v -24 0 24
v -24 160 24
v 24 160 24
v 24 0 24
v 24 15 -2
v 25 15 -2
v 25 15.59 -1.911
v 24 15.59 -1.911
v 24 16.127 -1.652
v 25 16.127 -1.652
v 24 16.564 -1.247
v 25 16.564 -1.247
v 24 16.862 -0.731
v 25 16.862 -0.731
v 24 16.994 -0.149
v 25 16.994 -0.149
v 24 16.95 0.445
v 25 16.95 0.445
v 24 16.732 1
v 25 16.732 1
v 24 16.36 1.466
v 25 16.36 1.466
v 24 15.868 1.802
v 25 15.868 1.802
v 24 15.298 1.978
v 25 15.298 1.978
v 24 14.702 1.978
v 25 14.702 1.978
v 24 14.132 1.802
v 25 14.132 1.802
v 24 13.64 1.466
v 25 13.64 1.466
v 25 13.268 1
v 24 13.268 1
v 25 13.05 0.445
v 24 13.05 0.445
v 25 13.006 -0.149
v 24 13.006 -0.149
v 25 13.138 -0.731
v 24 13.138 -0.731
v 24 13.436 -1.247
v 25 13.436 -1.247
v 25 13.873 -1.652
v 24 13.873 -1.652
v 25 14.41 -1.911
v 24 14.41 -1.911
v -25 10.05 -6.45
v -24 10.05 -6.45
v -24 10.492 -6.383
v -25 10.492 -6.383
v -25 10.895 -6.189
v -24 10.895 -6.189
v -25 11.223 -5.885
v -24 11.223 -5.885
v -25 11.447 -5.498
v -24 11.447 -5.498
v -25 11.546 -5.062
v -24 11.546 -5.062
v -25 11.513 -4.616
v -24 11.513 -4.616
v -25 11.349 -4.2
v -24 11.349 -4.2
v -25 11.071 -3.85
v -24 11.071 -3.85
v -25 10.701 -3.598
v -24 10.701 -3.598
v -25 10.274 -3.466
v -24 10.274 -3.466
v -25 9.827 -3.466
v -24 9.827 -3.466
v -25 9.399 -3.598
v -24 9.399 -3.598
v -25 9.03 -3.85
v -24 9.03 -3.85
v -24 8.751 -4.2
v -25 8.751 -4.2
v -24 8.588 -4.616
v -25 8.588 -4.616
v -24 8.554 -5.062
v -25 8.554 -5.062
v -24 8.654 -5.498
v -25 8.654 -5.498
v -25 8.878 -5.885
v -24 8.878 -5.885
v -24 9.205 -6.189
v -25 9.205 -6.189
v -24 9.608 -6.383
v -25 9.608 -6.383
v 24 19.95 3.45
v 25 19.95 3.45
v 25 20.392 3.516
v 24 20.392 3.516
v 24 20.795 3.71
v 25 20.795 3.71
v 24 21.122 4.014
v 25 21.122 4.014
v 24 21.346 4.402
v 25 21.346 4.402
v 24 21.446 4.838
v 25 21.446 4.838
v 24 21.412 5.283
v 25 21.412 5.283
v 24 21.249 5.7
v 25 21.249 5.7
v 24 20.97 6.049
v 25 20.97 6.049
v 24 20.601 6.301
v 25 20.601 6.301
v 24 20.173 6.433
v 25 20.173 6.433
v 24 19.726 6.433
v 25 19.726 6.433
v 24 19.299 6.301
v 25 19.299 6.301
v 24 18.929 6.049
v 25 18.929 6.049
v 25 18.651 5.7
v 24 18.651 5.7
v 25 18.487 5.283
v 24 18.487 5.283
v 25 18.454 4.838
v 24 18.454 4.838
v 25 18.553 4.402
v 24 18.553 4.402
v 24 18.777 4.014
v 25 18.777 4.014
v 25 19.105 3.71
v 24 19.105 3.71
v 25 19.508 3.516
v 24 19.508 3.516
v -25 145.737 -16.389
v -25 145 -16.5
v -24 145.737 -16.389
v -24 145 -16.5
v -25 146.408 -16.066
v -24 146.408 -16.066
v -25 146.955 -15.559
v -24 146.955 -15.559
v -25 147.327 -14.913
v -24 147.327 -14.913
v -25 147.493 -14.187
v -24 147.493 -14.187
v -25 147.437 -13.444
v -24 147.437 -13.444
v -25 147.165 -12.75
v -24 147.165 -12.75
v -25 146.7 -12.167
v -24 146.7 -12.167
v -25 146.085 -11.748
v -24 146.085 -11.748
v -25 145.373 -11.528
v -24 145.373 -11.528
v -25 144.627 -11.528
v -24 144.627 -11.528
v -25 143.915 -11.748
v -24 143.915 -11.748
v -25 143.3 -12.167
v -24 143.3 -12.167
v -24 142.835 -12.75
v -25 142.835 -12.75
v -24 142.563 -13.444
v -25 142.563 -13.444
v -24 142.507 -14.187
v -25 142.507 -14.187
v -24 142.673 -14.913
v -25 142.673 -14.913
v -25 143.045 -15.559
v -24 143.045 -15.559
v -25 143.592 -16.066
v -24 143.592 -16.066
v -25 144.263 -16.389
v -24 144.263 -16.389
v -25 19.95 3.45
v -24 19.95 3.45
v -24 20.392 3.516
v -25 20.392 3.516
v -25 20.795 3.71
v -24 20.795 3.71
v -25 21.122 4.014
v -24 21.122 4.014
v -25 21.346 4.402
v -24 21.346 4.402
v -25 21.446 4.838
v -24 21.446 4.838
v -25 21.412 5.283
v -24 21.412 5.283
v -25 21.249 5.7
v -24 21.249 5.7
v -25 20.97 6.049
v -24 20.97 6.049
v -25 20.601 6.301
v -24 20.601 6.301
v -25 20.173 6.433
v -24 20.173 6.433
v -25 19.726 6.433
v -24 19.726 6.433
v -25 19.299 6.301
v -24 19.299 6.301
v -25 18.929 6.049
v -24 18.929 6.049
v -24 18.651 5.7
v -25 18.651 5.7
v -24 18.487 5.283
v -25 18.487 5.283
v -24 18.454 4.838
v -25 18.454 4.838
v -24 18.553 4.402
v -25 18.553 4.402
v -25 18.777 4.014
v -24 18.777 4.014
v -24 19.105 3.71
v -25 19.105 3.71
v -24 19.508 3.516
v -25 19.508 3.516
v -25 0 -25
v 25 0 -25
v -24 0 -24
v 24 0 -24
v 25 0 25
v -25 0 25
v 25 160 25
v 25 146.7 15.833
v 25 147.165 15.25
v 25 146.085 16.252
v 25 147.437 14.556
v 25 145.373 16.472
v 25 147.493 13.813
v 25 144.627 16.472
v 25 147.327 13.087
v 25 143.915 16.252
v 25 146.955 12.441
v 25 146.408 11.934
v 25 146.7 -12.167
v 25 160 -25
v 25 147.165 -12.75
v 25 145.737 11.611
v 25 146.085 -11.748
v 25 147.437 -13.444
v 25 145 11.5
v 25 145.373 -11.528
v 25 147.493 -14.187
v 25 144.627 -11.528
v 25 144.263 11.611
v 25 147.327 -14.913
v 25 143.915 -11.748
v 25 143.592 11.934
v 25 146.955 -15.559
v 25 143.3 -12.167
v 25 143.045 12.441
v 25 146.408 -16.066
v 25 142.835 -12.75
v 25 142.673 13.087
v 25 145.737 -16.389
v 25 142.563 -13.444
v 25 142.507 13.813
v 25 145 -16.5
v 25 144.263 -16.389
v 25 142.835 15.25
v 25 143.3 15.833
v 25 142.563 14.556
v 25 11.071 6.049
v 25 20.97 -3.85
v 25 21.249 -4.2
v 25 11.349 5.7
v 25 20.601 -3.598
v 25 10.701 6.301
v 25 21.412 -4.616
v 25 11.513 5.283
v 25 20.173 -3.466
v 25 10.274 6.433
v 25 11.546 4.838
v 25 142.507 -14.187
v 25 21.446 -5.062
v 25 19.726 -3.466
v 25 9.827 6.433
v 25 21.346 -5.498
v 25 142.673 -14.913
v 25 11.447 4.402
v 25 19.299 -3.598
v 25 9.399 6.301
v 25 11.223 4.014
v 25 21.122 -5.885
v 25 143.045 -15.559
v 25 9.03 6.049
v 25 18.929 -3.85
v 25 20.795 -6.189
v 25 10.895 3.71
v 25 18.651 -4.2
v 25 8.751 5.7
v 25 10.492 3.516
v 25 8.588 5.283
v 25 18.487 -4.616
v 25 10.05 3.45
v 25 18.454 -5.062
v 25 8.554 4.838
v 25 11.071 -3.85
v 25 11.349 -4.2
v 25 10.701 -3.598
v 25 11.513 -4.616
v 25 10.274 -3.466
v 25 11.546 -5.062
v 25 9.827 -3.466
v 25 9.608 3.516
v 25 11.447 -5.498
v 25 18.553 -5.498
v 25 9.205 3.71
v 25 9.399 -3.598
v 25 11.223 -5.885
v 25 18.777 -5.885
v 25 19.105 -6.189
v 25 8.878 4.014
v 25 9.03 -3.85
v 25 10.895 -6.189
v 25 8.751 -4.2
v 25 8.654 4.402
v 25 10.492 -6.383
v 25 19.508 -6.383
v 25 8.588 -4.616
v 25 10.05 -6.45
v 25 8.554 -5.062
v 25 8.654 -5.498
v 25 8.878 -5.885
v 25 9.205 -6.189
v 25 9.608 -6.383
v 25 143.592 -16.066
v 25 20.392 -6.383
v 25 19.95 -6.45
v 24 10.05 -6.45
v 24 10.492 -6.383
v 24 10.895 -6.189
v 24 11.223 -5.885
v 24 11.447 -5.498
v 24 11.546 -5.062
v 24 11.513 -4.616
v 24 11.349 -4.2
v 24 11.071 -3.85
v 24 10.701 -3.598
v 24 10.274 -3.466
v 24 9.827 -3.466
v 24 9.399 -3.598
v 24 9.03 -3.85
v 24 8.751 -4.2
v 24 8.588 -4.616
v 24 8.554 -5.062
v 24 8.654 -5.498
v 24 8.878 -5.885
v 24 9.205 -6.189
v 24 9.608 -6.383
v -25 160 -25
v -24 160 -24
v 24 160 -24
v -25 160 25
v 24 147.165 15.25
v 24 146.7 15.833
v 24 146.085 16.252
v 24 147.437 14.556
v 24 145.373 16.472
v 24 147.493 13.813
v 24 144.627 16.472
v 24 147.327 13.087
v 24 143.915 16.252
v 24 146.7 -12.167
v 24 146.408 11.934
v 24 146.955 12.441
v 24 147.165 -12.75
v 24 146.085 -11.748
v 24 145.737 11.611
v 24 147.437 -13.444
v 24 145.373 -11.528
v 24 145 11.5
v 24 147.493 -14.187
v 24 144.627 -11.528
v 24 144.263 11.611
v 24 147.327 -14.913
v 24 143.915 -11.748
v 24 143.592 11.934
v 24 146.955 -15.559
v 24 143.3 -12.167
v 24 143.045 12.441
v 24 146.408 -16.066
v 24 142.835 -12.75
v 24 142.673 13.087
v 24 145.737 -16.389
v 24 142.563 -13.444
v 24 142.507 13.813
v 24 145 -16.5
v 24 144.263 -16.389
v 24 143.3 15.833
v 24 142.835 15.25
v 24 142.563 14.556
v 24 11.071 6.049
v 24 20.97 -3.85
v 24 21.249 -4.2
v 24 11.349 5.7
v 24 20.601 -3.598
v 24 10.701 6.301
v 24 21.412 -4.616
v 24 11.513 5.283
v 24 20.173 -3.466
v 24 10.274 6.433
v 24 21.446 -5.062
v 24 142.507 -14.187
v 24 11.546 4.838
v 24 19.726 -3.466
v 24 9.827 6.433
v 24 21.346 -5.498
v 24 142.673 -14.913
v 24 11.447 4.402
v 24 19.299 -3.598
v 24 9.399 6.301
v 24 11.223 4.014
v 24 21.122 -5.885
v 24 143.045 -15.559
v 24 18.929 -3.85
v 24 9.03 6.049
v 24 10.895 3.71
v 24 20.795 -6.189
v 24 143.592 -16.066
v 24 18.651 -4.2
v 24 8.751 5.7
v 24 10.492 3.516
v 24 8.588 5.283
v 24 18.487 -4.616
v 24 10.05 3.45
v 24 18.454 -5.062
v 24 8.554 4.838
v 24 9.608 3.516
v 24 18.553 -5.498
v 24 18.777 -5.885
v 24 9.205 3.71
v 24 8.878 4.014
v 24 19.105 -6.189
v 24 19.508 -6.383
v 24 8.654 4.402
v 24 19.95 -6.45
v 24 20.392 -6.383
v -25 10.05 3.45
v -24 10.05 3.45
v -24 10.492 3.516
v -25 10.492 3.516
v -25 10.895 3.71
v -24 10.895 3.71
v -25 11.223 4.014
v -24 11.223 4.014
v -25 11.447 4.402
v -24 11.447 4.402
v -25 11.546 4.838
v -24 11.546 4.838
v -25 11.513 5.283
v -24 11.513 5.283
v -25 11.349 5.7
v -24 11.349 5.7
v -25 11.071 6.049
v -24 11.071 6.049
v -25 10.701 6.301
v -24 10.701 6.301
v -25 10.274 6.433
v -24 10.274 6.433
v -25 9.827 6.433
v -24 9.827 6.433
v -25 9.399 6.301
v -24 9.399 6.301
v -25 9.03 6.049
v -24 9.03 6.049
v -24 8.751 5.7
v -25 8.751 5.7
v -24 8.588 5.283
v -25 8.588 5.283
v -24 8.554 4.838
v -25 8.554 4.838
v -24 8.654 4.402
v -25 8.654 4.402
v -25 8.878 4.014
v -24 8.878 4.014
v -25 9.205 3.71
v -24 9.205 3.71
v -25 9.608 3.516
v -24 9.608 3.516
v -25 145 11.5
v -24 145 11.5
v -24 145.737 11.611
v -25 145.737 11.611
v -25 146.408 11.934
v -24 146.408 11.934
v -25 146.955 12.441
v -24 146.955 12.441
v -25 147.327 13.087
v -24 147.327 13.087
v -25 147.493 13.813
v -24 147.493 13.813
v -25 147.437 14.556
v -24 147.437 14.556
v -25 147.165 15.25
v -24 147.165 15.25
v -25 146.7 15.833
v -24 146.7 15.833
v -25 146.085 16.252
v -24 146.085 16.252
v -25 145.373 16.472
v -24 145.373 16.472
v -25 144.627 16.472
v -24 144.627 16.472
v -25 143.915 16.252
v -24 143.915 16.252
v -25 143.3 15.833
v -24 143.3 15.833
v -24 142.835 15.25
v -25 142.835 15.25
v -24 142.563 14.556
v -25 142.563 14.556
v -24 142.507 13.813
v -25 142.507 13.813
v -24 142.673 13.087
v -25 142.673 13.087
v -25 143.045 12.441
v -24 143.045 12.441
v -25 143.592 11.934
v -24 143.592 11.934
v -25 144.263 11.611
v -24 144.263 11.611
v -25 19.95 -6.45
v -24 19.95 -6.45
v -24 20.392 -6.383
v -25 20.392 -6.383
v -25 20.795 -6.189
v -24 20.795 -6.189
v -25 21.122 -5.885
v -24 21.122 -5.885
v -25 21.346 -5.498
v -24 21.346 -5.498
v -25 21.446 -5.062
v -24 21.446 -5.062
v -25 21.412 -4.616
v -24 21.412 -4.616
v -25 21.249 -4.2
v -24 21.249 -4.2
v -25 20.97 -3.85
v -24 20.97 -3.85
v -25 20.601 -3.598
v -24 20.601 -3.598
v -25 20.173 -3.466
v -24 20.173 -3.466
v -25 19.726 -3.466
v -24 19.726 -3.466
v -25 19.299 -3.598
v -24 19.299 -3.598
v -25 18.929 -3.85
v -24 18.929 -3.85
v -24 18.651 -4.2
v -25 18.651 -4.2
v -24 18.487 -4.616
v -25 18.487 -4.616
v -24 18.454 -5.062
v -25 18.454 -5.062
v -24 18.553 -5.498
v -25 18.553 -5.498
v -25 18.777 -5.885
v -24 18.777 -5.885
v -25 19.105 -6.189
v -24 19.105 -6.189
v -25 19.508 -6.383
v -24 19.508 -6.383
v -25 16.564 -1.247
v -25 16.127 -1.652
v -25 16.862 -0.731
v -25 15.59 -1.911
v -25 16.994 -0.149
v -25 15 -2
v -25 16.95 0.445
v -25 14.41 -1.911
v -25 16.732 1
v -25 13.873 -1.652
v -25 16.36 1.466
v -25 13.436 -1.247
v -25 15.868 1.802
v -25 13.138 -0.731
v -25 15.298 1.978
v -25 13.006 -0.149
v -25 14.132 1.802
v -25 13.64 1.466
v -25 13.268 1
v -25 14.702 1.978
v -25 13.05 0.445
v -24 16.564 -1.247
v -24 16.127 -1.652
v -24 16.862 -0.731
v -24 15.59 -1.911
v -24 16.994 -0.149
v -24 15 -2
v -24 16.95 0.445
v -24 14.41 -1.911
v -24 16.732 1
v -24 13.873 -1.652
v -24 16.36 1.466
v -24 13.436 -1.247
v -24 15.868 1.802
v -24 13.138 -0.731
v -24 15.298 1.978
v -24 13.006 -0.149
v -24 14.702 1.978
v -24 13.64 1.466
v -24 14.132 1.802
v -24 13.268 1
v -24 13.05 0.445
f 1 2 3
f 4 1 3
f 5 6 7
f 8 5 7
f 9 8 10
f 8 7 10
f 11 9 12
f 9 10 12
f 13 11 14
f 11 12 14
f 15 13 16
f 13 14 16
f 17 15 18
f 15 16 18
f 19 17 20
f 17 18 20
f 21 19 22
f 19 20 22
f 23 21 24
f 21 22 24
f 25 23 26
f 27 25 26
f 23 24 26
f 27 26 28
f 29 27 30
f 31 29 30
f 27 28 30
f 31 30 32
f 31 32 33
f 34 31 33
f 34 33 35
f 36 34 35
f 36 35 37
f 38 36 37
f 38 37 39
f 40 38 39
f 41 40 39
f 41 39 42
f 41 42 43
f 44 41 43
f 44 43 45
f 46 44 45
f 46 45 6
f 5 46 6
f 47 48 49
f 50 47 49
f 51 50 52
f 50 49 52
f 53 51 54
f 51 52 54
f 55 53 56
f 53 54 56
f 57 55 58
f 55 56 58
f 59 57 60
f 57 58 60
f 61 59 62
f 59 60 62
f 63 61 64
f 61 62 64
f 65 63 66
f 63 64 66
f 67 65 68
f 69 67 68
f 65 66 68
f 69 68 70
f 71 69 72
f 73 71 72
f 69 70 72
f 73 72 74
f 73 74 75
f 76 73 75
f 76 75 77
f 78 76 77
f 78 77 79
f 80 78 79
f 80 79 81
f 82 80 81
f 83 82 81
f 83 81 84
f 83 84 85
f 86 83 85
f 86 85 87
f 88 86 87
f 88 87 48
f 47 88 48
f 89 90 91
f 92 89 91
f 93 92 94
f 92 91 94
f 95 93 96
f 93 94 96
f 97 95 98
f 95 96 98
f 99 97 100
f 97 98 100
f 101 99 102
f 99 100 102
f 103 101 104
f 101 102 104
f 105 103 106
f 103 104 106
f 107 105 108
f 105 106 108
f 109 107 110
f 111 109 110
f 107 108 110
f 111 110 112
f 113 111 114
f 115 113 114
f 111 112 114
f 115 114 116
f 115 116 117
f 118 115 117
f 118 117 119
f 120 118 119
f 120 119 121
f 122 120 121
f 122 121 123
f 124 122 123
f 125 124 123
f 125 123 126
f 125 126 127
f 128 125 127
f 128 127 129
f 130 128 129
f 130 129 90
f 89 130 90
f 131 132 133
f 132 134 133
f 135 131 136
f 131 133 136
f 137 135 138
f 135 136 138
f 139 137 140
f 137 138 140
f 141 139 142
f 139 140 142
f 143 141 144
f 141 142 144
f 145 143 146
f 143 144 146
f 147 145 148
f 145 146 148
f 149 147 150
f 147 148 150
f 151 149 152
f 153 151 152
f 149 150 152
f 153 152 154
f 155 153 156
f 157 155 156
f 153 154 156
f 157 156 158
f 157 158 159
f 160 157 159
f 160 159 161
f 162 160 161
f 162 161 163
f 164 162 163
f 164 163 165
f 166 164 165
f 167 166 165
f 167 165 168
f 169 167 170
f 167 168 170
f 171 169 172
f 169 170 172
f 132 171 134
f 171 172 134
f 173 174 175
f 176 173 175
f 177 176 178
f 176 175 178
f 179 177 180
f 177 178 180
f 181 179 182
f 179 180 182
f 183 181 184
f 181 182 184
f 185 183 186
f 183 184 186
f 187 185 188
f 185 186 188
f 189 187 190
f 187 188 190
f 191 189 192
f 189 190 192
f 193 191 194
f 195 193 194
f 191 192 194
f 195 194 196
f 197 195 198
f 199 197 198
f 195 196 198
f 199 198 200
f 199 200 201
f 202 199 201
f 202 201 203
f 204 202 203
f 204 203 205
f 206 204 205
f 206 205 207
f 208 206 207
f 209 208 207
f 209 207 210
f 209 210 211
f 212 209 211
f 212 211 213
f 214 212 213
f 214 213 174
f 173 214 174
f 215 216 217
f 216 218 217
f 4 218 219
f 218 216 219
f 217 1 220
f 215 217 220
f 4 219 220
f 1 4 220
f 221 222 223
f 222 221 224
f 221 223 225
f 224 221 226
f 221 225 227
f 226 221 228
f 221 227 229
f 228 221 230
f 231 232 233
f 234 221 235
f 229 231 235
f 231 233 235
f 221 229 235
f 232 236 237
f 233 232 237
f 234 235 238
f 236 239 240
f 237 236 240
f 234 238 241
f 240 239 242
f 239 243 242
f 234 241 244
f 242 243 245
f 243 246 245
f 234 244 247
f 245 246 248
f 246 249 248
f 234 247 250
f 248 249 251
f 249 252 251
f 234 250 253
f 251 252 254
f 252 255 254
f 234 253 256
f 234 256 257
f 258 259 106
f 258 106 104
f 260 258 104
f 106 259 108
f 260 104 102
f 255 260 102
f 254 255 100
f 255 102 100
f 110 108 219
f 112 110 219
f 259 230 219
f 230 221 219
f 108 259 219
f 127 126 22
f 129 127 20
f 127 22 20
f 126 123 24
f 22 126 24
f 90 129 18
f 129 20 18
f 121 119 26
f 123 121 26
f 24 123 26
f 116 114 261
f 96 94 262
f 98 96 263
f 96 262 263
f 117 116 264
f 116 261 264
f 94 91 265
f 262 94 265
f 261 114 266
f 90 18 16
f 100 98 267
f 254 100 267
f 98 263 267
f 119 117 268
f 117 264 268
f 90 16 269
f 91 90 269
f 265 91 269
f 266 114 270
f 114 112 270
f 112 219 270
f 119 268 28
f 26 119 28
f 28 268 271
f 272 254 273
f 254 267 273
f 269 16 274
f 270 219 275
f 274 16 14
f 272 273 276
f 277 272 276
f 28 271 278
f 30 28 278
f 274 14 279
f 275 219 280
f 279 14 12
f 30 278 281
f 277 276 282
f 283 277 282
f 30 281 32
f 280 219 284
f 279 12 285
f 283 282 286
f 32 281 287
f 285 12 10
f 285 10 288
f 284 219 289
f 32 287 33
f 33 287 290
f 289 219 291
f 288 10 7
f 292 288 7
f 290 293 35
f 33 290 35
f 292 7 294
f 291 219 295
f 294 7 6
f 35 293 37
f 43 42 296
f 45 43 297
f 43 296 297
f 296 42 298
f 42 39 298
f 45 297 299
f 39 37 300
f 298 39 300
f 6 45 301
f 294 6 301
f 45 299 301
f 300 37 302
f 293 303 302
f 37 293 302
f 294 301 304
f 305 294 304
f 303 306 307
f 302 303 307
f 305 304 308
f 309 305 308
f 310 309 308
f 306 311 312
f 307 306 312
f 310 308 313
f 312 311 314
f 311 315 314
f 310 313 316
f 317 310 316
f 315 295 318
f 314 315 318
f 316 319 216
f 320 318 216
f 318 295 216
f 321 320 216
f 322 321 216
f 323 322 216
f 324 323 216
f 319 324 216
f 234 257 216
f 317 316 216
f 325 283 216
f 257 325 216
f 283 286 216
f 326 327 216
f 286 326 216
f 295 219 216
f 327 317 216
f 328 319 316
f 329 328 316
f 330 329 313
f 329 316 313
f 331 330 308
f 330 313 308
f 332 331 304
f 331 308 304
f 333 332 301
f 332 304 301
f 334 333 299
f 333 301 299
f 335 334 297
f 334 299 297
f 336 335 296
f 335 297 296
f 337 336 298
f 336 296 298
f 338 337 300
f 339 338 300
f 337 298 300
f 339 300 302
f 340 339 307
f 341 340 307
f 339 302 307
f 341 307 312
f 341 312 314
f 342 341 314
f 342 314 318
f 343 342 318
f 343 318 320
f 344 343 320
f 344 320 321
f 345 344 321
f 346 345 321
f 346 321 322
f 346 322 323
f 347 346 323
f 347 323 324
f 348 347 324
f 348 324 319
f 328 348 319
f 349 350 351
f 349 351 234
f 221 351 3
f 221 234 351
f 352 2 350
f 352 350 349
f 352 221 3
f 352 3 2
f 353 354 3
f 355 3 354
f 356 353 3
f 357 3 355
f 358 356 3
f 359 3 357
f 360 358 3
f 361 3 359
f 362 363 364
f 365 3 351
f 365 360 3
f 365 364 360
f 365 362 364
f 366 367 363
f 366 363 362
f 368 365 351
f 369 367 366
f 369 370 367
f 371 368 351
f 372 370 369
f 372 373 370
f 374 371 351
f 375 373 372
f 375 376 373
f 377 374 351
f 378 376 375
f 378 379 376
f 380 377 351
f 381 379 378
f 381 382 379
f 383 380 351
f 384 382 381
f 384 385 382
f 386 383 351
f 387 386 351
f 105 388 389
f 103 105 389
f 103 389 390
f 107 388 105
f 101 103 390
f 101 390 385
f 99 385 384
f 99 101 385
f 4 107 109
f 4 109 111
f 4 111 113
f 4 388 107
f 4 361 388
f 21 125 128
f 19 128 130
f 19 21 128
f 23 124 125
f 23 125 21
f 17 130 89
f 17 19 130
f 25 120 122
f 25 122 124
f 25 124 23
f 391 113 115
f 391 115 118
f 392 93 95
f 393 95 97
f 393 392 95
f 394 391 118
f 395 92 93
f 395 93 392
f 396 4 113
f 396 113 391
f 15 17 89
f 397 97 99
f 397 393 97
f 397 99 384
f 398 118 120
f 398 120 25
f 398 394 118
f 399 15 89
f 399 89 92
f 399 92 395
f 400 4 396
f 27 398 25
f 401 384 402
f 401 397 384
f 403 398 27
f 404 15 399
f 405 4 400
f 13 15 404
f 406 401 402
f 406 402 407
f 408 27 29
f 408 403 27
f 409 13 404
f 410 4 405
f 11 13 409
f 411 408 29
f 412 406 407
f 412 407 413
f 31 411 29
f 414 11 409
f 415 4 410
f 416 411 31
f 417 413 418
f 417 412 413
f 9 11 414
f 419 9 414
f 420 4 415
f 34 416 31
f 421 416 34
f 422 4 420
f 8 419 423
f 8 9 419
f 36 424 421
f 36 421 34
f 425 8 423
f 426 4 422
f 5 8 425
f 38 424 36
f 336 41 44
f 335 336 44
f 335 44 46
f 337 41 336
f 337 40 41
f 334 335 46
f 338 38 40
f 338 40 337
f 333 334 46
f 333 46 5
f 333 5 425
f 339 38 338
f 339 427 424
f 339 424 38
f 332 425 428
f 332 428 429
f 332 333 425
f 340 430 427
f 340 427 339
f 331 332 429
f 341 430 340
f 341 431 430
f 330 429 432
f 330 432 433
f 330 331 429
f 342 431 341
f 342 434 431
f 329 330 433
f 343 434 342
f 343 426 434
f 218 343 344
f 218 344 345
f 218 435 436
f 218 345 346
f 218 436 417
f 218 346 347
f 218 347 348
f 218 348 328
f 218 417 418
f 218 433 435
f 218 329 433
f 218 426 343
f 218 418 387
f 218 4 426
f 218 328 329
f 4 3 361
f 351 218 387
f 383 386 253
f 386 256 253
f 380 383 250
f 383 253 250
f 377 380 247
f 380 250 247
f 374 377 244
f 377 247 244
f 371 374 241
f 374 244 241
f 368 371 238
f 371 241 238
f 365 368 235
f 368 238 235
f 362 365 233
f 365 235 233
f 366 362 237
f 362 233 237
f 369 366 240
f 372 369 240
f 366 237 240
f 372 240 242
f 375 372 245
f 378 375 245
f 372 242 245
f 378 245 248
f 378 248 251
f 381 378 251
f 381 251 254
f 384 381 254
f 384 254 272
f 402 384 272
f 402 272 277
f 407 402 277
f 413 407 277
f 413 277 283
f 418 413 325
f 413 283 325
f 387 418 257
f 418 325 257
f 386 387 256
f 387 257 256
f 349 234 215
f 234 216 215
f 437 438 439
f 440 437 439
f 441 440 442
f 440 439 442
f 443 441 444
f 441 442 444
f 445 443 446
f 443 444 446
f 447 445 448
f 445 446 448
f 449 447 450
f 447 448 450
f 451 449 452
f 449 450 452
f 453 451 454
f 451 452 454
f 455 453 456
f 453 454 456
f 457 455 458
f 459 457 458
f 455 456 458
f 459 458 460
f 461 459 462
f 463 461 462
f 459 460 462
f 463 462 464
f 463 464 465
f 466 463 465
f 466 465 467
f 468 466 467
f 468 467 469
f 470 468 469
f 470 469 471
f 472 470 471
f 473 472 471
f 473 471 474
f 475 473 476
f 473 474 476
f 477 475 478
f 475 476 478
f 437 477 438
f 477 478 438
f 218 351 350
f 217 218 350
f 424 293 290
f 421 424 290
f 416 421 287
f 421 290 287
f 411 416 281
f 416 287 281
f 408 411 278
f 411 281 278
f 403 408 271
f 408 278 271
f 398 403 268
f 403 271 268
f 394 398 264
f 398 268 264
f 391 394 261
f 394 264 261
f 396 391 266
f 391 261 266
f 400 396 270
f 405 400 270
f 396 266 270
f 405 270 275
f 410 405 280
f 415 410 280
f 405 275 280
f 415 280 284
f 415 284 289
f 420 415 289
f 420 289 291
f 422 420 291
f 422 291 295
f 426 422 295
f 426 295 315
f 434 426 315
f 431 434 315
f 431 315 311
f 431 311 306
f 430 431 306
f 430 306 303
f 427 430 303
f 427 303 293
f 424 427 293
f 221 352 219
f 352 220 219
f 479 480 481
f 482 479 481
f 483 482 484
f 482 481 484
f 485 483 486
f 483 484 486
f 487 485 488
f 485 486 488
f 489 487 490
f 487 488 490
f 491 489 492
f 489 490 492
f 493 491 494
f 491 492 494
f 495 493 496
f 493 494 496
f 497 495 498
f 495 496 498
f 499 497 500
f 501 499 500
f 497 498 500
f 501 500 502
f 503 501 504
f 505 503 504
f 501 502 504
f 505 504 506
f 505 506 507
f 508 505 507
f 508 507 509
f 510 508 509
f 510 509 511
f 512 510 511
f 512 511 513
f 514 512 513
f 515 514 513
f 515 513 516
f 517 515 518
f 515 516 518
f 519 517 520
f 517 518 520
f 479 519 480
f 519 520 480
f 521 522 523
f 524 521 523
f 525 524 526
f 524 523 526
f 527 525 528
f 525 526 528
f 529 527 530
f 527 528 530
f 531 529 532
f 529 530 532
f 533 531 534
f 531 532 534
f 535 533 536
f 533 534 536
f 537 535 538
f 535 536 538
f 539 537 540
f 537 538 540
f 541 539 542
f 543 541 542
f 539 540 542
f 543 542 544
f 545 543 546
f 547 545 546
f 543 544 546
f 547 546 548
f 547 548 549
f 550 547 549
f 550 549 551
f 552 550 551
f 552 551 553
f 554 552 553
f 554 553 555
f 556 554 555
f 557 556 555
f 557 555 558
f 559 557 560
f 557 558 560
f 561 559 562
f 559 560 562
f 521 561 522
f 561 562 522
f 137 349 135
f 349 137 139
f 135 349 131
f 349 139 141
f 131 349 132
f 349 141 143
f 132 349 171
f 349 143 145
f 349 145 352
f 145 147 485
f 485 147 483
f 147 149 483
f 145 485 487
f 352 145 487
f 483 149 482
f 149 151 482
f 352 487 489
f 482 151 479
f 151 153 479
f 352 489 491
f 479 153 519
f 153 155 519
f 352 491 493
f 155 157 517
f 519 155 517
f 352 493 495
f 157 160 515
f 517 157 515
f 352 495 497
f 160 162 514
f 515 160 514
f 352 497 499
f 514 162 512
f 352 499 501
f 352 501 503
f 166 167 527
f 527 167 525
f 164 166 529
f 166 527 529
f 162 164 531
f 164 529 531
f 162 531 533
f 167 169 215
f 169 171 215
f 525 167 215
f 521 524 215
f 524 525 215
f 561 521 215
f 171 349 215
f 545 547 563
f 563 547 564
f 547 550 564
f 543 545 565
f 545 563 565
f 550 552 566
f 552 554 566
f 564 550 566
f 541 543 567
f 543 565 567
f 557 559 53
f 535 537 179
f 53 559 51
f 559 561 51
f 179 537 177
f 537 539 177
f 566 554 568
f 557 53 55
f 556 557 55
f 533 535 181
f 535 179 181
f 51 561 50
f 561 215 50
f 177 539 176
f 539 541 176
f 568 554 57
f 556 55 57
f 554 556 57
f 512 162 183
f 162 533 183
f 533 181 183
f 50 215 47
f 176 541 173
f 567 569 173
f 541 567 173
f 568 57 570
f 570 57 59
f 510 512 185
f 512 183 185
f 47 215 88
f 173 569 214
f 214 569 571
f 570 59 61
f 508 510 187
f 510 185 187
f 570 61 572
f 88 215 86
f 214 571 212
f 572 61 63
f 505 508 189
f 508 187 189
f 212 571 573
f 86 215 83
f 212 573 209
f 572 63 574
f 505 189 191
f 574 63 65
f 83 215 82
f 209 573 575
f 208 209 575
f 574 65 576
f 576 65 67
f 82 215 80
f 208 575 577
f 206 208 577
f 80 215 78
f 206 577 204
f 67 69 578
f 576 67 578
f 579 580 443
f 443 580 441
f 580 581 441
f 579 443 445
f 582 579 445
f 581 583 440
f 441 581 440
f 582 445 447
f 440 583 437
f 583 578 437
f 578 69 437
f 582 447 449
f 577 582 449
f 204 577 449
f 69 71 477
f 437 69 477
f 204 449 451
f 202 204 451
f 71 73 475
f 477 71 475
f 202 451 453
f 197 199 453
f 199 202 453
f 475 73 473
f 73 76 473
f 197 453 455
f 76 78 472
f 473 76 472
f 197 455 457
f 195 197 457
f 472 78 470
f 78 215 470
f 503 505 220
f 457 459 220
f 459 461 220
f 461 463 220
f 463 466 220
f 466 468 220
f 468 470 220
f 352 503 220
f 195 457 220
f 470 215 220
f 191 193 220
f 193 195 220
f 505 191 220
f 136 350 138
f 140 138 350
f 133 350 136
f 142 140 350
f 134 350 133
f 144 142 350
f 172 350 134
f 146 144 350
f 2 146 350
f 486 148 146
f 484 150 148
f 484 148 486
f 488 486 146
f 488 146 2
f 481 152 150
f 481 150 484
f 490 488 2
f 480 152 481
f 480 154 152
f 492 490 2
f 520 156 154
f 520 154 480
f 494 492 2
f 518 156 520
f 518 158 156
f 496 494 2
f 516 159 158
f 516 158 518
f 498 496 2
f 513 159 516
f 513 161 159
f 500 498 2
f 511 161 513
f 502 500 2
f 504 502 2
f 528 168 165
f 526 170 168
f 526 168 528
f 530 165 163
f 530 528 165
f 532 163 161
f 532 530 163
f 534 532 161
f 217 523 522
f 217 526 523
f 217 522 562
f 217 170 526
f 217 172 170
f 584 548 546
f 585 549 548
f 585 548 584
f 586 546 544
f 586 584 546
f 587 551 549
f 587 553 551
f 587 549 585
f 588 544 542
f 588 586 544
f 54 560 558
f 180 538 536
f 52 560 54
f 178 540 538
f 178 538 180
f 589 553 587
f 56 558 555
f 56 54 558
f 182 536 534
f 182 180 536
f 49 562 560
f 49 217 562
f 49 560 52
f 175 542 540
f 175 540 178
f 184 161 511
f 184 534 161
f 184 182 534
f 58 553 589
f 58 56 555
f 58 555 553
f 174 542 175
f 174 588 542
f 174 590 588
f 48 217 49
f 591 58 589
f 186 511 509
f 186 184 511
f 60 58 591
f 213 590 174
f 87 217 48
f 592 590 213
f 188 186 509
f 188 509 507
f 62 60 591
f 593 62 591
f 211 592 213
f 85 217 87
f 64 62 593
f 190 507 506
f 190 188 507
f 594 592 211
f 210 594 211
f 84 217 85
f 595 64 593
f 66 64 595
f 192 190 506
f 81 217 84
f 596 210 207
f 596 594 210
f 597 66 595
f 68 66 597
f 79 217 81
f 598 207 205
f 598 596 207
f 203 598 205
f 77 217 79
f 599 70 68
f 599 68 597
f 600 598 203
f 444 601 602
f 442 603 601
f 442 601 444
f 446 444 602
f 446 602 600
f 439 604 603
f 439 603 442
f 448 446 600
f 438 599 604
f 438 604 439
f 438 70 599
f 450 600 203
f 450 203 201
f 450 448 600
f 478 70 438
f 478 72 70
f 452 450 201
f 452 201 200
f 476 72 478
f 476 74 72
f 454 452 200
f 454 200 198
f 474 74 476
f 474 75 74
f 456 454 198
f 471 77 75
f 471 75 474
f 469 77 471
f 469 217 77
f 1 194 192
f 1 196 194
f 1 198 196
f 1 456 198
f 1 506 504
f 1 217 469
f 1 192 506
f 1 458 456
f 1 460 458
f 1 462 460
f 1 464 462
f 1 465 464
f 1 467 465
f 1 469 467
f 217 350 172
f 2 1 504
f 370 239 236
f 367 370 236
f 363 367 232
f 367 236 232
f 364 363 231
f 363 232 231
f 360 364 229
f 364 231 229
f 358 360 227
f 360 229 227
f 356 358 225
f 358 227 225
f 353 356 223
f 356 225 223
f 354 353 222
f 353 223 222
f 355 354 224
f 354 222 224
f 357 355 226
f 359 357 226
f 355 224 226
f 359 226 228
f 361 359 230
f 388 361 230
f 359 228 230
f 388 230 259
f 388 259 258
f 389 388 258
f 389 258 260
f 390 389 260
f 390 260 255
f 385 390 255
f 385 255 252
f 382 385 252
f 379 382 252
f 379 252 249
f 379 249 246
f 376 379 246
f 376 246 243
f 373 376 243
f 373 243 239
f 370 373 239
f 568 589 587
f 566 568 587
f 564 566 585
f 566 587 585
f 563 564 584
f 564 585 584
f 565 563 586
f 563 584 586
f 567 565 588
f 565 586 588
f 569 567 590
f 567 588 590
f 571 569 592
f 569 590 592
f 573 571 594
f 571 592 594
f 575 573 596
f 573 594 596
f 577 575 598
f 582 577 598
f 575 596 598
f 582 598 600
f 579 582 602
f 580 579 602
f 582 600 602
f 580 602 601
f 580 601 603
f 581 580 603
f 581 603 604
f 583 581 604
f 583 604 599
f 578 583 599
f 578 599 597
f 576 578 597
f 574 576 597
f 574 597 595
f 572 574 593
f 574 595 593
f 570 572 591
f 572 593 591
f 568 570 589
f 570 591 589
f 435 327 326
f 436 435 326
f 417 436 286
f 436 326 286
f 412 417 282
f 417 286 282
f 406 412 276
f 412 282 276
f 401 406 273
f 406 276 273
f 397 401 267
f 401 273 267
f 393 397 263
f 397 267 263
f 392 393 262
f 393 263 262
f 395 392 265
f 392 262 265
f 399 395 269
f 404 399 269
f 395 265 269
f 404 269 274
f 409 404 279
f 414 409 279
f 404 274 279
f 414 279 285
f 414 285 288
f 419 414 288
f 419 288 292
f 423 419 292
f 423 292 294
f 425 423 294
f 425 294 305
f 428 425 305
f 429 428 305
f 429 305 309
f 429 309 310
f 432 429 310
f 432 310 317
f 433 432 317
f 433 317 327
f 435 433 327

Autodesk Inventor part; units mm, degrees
ref_plane "YZ Plane" through (0, 0, 0) normal (1, 0, 0) x (0, 1, 0)
ref_plane "XZ Plane" through (0, 0, 0) normal (0, 1, 0) x (-1, 0, 0)
ref_plane "XY Plane" through (0, 0, 0) normal (0, 0, 1) x (1, 0, 0)
sketch "Sketch1" plane through (0, 0, 0) normal (0, 1, 0) x (-1, 0, 0)
  line L0 (25, 25) -> (-25, 25)
  line L1 (-25, 25) -> (-25, -25)
  line L2 (-25, -25) -> (25, -25)
  line L3 (25, -25) -> (25, 25)
  line L4 (25, 25) -> (-25, -25) construction
  line L5 (-25, 25) -> (25, -25) construction
  line L6 (24, 24) -> (-24, 24)
  line L7 (-24, 24) -> (-24, -24)
  line L8 (-24, -24) -> (24, -24)
  line L9 (24, -24) -> (24, 24)
  line L10 (24, 24) -> (-24, -24) construction
  line L11 (-24, 24) -> (24, -24) construction
  point P0 (0, 0)
  dimension "d0" = 50
  dimension "d2" = 48
extrude "Extrusion1" add sketch "Sketch1" along normal blind 160
sketch "Sketch2" plane through (25, 0, 25) normal (1, 0, 0) x (0, 0, -1)
  line L0 (0, 0) -> (48, 0) construction
  line L1 (0, 0) -> (0, 15) construction
  line L2 (0, 15) -> (11, 15) construction
  line L3 (11, 15) -> (39, 15) construction
  line L4 (25, 15) -> (20.0503, 19.9497) construction
  line L5 (25, 15) -> (32, 15) construction
  line L6 (20.0503, 19.9497) -> (20.0503, 22.4497) construction
  line L7 (21.4936, 22.4497) -> (22.937, 19.9497)
  line L8 (22.937, 19.9497) -> (21.4936, 17.4497)
  line L9 (21.4936, 17.4497) -> (18.6069, 17.4497)
  line L10 (18.6069, 17.4497) -> (17.1635, 19.9497)
  line L11 (17.1635, 19.9497) -> (18.6069, 22.4497)
  line L12 (18.6069, 22.4497) -> (21.4936, 22.4497)
  line L13 (25, 15) -> (25, 18.7194) construction
  circle A0 centre (20.0503, 19.9497) radius 1.5
  line L14 (29.9497, 19.9497) -> (29.9497, 22.4497) construction
  line L15 (28.5064, 22.4497) -> (27.063, 19.9497)
  line L16 (27.063, 19.9497) -> (28.5064, 17.4497)
  line L17 (28.5064, 17.4497) -> (31.3931, 17.4497)
  line L18 (31.3931, 22.4497) -> (28.5064, 22.4497)
  line L19 (32.8365, 19.9497) -> (31.3931, 22.4497)
  line L20 (31.3931, 17.4497) -> (32.8365, 19.9497)
  circle A1 centre (29.9497, 19.9497) radius 1.5
  line L21 (20.0503, 10.0503) -> (20.0503, 7.5503) construction
  line L22 (21.4936, 7.5503) -> (22.937, 10.0503)
  line L23 (22.937, 10.0503) -> (21.4936, 12.5503)
  line L24 (21.4936, 12.5503) -> (18.6069, 12.5503)
  line L25 (18.6069, 7.5503) -> (21.4936, 7.5503)
  line L26 (17.1635, 10.0503) -> (18.6069, 7.5503)
  line L27 (18.6069, 12.5503) -> (17.1635, 10.0503)
  circle A2 centre (20.0503, 10.0503) radius 1.5
  line L28 (27.063, 10.0503) -> (28.5064, 12.5503)
  line L29 (28.5064, 12.5503) -> (31.3931, 12.5503)
  line L30 (28.5064, 7.5503) -> (27.063, 10.0503)
  circle A3 centre (29.9497, 10.0503) radius 1.5
  line L31 (31.3931, 12.5503) -> (32.8365, 10.0503)
  line L32 (31.3931, 7.5503) -> (28.5064, 7.5503)
  line L33 (32.8365, 10.0503) -> (31.3931, 7.5503)
  line L34 (29.9497, 10.0503) -> (29.9497, 7.5503) construction
  line L35 (0, 15) -> (0, 30) construction
  line L36 (0, 0) -> (0, 160) construction
  line L37 (25, 145) -> (32, 145) construction
  circle A4 centre (39, 145) radius 2.5
  line L38 (11, 145) -> (39, 145) construction
  line L39 (0, 130) -> (48, 130) construction
  line L40 (25, 145) -> (20.0503, 149.9497) construction
  line L41 (25, 145) -> (25, 148.7194) construction
  line L42 (0, 130) -> (0, 145) construction
  line L43 (0, 145) -> (11, 145) construction
  circle A5 centre (11, 145) radius 2.5
  line L44 (0, 145) -> (0, 160) construction
  circle A6 centre (25, 15) radius 2
  point P0 (25, 0)
  point P1 (25, 11.2806)
  dimension "d6" = 15
  dimension "d7" = 11
  dimension "d8" = 28
  dimension "d11" = 7
  dimension "d12" = 135
  dimension "d13" = 2.5
  dimension "d18" = 3
  dimension "d19" = 15
  dimension "d20" = 15
  dimension "d21" = 11
  dimension "d22" = 28
  dimension "d23" = 5
  dimension "d24" = 5
  dimension "d25" = 7
  dimension "d26" = 135
  dimension "d29" = 15
  dimension "d30" = 4
extrude "Extrusion2" cut sketch "Sketch2" against normal blind 50 contours A0 | A1 | A2 | A3 | A4 | A5 | A6
properties part number "End-Link" material "Aluminum 6061"
